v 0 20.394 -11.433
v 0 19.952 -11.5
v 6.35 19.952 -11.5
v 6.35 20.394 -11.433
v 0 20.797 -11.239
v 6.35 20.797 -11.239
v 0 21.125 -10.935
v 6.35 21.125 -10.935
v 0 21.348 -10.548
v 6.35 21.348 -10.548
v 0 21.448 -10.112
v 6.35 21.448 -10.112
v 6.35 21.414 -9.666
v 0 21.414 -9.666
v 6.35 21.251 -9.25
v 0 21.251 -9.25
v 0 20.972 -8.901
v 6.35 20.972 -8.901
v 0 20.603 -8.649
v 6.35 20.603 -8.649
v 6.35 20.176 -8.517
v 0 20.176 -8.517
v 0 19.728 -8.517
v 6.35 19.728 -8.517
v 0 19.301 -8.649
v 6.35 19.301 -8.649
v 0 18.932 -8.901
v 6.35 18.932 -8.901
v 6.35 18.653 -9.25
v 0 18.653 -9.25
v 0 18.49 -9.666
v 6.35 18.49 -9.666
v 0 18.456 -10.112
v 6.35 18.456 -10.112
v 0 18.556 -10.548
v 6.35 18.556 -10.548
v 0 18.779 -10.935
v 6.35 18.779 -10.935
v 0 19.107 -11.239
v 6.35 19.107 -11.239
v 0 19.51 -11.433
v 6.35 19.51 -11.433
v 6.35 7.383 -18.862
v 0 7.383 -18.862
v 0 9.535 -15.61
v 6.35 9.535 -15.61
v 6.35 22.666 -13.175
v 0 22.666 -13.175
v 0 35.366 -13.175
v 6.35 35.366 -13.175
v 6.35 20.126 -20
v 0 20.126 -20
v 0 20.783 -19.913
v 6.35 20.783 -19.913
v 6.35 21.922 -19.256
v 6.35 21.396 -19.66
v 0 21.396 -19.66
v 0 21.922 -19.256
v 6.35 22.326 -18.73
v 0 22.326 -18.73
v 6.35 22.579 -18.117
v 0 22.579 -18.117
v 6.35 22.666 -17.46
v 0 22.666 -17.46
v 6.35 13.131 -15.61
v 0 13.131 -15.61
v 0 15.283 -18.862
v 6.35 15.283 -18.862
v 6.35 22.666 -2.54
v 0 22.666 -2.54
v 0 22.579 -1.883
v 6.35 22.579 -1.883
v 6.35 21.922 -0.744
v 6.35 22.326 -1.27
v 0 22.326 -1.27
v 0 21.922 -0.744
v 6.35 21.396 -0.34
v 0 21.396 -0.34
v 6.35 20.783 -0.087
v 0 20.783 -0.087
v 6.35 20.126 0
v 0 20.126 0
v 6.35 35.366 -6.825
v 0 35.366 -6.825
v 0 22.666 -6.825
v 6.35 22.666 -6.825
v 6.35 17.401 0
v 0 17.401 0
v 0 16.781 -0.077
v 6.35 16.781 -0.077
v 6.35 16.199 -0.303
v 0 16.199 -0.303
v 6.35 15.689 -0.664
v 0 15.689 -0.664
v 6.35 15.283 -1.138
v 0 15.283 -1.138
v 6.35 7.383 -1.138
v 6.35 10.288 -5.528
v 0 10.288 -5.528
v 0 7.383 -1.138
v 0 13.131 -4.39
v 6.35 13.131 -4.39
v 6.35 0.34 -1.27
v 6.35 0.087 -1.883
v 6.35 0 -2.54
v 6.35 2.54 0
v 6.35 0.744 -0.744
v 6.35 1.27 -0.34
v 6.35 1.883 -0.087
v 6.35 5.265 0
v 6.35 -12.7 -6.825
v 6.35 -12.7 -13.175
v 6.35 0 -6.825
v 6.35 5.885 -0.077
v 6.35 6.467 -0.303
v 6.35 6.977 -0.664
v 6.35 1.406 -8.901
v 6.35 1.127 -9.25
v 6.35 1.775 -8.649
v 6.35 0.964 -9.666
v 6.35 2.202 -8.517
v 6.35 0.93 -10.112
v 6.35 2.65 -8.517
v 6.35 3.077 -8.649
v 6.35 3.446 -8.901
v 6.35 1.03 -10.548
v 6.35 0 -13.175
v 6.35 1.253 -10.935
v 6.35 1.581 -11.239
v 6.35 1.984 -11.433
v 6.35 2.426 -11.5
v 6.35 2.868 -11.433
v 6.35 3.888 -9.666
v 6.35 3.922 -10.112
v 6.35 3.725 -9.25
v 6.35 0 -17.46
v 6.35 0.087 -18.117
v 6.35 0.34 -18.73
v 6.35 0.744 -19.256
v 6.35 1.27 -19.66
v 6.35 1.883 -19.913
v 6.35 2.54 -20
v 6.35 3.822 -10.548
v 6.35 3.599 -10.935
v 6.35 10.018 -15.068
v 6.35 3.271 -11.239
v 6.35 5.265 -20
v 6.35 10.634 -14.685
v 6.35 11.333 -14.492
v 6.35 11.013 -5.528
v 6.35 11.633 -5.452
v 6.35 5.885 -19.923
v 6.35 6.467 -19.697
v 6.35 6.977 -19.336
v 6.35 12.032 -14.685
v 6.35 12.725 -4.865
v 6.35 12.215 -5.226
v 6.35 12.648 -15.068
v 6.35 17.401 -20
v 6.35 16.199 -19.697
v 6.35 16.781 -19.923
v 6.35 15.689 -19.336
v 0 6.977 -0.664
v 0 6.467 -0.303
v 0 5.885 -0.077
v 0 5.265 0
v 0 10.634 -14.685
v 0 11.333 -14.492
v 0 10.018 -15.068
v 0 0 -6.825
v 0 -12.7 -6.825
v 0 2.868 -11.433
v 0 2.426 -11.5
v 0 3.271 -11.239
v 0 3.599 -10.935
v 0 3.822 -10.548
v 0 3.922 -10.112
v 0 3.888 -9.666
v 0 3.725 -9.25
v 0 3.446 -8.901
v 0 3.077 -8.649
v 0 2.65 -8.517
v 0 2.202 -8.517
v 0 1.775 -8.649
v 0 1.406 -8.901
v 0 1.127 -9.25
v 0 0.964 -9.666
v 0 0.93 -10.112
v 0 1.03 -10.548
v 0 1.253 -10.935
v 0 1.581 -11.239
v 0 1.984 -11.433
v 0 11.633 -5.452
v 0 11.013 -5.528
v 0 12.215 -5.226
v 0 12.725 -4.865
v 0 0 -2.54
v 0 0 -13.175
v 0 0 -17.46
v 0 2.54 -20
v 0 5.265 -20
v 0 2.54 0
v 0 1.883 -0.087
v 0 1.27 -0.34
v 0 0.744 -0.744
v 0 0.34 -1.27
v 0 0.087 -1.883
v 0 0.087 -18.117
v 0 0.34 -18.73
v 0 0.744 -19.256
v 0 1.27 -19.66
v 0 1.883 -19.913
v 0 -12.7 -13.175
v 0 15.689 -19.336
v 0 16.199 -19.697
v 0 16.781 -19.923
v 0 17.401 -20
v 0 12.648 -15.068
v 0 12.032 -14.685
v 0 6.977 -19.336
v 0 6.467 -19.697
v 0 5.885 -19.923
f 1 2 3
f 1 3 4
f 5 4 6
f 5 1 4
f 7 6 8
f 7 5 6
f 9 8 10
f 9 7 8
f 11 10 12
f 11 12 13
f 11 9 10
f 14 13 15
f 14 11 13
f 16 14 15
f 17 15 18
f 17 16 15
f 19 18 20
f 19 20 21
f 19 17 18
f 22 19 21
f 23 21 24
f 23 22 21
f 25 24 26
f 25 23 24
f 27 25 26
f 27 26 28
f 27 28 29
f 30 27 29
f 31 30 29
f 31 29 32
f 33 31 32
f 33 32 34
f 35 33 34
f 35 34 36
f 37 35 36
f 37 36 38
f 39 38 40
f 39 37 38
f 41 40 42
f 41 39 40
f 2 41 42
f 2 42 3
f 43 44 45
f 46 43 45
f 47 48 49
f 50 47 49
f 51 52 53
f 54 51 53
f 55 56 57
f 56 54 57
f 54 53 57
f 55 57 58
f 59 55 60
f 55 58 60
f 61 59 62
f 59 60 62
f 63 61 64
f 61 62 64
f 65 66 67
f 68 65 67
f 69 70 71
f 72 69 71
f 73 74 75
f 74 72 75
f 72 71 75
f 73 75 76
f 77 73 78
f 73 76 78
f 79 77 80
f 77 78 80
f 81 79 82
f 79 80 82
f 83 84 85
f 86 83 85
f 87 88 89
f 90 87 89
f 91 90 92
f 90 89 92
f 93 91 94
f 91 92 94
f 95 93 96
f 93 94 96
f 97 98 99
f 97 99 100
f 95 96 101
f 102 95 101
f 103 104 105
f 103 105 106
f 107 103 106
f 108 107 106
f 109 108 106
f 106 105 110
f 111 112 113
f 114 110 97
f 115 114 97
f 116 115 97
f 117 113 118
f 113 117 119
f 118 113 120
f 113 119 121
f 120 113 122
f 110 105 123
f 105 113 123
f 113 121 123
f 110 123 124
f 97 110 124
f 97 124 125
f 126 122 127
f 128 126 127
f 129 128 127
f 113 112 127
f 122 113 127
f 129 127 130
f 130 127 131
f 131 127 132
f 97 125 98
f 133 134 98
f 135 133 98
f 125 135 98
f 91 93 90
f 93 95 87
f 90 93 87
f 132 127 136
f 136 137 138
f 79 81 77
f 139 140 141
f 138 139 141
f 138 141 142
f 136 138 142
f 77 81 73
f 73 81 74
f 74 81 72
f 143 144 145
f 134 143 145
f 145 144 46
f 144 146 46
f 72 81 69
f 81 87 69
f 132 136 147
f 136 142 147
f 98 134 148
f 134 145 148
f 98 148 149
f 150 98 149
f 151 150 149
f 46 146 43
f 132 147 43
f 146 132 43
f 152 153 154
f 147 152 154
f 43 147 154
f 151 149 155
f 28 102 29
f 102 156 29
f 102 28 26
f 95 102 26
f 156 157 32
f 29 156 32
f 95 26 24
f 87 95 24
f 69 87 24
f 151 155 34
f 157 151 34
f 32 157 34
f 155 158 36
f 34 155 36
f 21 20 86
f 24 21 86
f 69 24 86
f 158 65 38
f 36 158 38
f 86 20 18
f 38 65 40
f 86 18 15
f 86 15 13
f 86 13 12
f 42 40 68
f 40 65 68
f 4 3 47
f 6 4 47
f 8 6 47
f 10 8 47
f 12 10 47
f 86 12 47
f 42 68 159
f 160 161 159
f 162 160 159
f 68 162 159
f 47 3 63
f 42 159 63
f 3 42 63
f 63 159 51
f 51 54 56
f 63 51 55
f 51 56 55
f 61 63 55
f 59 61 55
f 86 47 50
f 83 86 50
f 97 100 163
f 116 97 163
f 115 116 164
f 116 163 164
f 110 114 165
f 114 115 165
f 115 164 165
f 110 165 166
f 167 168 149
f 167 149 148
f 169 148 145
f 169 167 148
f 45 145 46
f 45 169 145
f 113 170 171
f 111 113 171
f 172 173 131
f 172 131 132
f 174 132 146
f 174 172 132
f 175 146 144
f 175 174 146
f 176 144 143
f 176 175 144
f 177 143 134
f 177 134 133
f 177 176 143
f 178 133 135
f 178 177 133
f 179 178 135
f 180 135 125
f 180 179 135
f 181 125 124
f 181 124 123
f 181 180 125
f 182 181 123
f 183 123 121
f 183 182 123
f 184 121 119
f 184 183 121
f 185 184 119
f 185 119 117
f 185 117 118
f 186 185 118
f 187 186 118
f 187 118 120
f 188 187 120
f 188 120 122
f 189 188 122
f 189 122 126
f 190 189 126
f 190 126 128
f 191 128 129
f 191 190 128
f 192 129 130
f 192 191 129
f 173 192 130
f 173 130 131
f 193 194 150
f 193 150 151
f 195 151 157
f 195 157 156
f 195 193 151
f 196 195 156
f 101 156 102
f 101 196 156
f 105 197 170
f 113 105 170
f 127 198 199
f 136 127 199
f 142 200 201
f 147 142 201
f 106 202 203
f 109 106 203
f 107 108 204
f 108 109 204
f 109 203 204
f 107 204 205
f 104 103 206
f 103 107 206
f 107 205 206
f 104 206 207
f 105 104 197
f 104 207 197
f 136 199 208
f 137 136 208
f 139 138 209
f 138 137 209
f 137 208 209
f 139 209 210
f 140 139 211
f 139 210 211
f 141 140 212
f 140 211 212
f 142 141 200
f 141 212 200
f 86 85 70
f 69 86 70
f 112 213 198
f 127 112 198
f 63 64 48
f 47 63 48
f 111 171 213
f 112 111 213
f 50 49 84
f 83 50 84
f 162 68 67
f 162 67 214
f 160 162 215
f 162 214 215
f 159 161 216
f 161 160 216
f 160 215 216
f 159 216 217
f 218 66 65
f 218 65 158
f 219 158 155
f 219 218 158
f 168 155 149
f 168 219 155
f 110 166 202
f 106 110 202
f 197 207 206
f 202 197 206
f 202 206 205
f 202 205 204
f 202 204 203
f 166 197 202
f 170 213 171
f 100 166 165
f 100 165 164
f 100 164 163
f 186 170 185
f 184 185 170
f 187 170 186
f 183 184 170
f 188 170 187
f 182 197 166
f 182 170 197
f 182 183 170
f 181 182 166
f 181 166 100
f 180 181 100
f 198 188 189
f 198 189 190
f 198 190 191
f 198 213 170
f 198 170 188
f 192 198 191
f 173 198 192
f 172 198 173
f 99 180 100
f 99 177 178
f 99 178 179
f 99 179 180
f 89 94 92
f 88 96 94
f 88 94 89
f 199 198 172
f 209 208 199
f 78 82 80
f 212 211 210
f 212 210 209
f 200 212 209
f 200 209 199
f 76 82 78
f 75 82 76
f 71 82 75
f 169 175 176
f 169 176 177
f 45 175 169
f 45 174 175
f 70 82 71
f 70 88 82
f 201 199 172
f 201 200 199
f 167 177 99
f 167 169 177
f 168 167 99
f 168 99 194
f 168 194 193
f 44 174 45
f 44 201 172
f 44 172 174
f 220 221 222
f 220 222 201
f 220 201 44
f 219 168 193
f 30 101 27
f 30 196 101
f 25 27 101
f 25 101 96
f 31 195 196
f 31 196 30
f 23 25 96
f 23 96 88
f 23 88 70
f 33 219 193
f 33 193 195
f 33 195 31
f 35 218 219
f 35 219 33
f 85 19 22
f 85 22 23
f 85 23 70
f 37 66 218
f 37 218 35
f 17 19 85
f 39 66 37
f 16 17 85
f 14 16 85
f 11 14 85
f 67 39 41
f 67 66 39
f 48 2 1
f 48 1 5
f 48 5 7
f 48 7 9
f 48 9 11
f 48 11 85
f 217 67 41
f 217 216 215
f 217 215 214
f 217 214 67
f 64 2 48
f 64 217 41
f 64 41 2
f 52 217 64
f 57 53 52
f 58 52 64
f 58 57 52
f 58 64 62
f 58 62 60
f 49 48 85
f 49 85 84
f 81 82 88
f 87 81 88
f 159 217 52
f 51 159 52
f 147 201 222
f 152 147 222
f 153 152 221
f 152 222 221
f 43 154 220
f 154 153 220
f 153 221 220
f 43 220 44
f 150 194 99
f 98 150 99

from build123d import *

# Parameters (mm, degrees)
SKETCH1_R           = 1.49987
BOSS_EXTRUDE1_DEPTH = 6.35
FILLET1_R           = 2.54


with BuildPart() as part:
    # Sketch1 → Boss-Extrude1 (new body)
    with BuildSketch(Plane(origin=(0, 0, 0), x_dir=(0, 0, -1), z_dir=(1, 0, 0))):
        Polygon((0, 0), (6.825, 0), (6.825, -12.7), (13.175, -12.7), (13.175, 0), (20, 0), (20, 6.629574014), (14.471500996, 10.288392178), (14.471500996, 12.377602622), (20, 16.036420786), (20, 22.6659948), (13.175, 22.6659948), (13.175, 35.3659948), (6.825, 35.3659948), (6.825, 22.6659948), (0, 22.6659948), (0, 16.036420786), (5.528499004, 12.377602622), (5.528499004, 10.288392178), (0, 6.629574014), align=None)
        with Locations((10, 19.9520048)):
            Circle(SKETCH1_R, mode=Mode.SUBTRACT)
        with Locations((10, 2.4260048)):
            Circle(SKETCH1_R, mode=Mode.SUBTRACT)
    extrude(amount=BOSS_EXTRUDE1_DEPTH)

    # Fillet1
    # the kernel refuses this fillet: 2.54 mm, written as the material it adds along each edge
    with BuildSketch(Plane(origin=(0, 12.377602622, -14.471500996), x_dir=(0, -1, 0), z_dir=(1, 0, 0)), Plane(origin=(0, 10.288392178, -14.471500996), x_dir=(0, -0.5518934032294348, -0.8339146667806201), z_dir=(1, 0, 0)), Plane(origin=(0, 12.377602622, -5.528499004), x_dir=(0, 0.5518934032294354, 0.8339146667806197), z_dir=(1, 0, 0))) as fillet1_piece_1:
        with BuildLine():
            CenterArc((FILLET1_R * 0.537353058558, FILLET1_R), FILLET1_R, 213.497005554, 56.502994446)
            Line((-FILLET1_R * 0.296561608223, FILLET1_R * 0.448106596771), (0, 0))
            Line((0, 0), (FILLET1_R * 0.537353058558, 0))
        make_face()
    extrude(amount=6.35)
    # the kernel refuses this fillet: 2.54 mm, written as the material it takes off along each edge
    with BuildSketch(Plane(origin=(-3.412191922, 16.036420786, -20), x_dir=(0, -0.5518934032294348, 0.8339146667806201), z_dir=(1, 0, 0)), Plane(origin=(-3.412191922, 6.629574014, -20), x_dir=(0, -1, 0), z_dir=(1, 0, 0)), Plane(origin=(-3.412191922, 16.036420786, 0), x_dir=(0, 1, 0), z_dir=(1, 0, 0))) as fillet1_2_piece_1:
        with BuildLine():
            CenterArc((FILLET1_R * 0.537353058558, -FILLET1_R), FILLET1_R, 90, 56.502994446)
            Line((-FILLET1_R * 0.296561608223, -FILLET1_R * 0.448106596771), (0, 0))
            Line((0, 0), (FILLET1_R * 0.537353058558, 0))
        make_face()
    extrude(amount=13.174383844, mode=Mode.SUBTRACT)
    with BuildSketch(Plane(origin=(-6.35, 0, -20), x_dir=(0, 0, 1), z_dir=(1, 0, 0)), Plane(origin=(-6.35, 22.6659948, 0), x_dir=(0, 0, -1), z_dir=(1, 0, 0)), Plane(origin=(-6.35, 22.6659948, -20), x_dir=(0, -1, 0), z_dir=(1, 0, 0))) as fillet1_2_piece_2:
        with BuildLine():
            CenterArc((FILLET1_R, -FILLET1_R), FILLET1_R, 90, 90)
            Line((0, -FILLET1_R), (0, 0))
            Line((0, 0), (FILLET1_R, 0))
        make_face()
    extrude(amount=19.05, mode=Mode.SUBTRACT)
    with BuildSketch(Plane(origin=(-6.35, 0, 0), x_dir=(0, 0, -1), z_dir=(1, 0, 0))) as fillet1_2_piece_3:
        with BuildLine():
            CenterArc((FILLET1_R, FILLET1_R), FILLET1_R, 180, 90)
            Line((0, FILLET1_R), (0, 0))
            Line((0, 0), (FILLET1_R, 0))
        make_face()
    extrude(amount=19.05, mode=Mode.SUBTRACT)
    with BuildSketch(Plane(origin=(-3.412191922, 6.629574014, 0), x_dir=(0, -1, 0), z_dir=(1, 0, 0))) as fillet1_2_piece_4:
        with BuildLine():
            CenterArc((FILLET1_R * 0.537353058558, FILLET1_R), FILLET1_R, 213.497005554, 56.502994446)
            Line((-FILLET1_R * 0.296561608223, FILLET1_R * 0.448106596771), (0, 0))
            Line((0, 0), (FILLET1_R * 0.537353058558, 0))
        make_face()
    extrude(amount=13.174383844, mode=Mode.SUBTRACT)


solid = part.part
